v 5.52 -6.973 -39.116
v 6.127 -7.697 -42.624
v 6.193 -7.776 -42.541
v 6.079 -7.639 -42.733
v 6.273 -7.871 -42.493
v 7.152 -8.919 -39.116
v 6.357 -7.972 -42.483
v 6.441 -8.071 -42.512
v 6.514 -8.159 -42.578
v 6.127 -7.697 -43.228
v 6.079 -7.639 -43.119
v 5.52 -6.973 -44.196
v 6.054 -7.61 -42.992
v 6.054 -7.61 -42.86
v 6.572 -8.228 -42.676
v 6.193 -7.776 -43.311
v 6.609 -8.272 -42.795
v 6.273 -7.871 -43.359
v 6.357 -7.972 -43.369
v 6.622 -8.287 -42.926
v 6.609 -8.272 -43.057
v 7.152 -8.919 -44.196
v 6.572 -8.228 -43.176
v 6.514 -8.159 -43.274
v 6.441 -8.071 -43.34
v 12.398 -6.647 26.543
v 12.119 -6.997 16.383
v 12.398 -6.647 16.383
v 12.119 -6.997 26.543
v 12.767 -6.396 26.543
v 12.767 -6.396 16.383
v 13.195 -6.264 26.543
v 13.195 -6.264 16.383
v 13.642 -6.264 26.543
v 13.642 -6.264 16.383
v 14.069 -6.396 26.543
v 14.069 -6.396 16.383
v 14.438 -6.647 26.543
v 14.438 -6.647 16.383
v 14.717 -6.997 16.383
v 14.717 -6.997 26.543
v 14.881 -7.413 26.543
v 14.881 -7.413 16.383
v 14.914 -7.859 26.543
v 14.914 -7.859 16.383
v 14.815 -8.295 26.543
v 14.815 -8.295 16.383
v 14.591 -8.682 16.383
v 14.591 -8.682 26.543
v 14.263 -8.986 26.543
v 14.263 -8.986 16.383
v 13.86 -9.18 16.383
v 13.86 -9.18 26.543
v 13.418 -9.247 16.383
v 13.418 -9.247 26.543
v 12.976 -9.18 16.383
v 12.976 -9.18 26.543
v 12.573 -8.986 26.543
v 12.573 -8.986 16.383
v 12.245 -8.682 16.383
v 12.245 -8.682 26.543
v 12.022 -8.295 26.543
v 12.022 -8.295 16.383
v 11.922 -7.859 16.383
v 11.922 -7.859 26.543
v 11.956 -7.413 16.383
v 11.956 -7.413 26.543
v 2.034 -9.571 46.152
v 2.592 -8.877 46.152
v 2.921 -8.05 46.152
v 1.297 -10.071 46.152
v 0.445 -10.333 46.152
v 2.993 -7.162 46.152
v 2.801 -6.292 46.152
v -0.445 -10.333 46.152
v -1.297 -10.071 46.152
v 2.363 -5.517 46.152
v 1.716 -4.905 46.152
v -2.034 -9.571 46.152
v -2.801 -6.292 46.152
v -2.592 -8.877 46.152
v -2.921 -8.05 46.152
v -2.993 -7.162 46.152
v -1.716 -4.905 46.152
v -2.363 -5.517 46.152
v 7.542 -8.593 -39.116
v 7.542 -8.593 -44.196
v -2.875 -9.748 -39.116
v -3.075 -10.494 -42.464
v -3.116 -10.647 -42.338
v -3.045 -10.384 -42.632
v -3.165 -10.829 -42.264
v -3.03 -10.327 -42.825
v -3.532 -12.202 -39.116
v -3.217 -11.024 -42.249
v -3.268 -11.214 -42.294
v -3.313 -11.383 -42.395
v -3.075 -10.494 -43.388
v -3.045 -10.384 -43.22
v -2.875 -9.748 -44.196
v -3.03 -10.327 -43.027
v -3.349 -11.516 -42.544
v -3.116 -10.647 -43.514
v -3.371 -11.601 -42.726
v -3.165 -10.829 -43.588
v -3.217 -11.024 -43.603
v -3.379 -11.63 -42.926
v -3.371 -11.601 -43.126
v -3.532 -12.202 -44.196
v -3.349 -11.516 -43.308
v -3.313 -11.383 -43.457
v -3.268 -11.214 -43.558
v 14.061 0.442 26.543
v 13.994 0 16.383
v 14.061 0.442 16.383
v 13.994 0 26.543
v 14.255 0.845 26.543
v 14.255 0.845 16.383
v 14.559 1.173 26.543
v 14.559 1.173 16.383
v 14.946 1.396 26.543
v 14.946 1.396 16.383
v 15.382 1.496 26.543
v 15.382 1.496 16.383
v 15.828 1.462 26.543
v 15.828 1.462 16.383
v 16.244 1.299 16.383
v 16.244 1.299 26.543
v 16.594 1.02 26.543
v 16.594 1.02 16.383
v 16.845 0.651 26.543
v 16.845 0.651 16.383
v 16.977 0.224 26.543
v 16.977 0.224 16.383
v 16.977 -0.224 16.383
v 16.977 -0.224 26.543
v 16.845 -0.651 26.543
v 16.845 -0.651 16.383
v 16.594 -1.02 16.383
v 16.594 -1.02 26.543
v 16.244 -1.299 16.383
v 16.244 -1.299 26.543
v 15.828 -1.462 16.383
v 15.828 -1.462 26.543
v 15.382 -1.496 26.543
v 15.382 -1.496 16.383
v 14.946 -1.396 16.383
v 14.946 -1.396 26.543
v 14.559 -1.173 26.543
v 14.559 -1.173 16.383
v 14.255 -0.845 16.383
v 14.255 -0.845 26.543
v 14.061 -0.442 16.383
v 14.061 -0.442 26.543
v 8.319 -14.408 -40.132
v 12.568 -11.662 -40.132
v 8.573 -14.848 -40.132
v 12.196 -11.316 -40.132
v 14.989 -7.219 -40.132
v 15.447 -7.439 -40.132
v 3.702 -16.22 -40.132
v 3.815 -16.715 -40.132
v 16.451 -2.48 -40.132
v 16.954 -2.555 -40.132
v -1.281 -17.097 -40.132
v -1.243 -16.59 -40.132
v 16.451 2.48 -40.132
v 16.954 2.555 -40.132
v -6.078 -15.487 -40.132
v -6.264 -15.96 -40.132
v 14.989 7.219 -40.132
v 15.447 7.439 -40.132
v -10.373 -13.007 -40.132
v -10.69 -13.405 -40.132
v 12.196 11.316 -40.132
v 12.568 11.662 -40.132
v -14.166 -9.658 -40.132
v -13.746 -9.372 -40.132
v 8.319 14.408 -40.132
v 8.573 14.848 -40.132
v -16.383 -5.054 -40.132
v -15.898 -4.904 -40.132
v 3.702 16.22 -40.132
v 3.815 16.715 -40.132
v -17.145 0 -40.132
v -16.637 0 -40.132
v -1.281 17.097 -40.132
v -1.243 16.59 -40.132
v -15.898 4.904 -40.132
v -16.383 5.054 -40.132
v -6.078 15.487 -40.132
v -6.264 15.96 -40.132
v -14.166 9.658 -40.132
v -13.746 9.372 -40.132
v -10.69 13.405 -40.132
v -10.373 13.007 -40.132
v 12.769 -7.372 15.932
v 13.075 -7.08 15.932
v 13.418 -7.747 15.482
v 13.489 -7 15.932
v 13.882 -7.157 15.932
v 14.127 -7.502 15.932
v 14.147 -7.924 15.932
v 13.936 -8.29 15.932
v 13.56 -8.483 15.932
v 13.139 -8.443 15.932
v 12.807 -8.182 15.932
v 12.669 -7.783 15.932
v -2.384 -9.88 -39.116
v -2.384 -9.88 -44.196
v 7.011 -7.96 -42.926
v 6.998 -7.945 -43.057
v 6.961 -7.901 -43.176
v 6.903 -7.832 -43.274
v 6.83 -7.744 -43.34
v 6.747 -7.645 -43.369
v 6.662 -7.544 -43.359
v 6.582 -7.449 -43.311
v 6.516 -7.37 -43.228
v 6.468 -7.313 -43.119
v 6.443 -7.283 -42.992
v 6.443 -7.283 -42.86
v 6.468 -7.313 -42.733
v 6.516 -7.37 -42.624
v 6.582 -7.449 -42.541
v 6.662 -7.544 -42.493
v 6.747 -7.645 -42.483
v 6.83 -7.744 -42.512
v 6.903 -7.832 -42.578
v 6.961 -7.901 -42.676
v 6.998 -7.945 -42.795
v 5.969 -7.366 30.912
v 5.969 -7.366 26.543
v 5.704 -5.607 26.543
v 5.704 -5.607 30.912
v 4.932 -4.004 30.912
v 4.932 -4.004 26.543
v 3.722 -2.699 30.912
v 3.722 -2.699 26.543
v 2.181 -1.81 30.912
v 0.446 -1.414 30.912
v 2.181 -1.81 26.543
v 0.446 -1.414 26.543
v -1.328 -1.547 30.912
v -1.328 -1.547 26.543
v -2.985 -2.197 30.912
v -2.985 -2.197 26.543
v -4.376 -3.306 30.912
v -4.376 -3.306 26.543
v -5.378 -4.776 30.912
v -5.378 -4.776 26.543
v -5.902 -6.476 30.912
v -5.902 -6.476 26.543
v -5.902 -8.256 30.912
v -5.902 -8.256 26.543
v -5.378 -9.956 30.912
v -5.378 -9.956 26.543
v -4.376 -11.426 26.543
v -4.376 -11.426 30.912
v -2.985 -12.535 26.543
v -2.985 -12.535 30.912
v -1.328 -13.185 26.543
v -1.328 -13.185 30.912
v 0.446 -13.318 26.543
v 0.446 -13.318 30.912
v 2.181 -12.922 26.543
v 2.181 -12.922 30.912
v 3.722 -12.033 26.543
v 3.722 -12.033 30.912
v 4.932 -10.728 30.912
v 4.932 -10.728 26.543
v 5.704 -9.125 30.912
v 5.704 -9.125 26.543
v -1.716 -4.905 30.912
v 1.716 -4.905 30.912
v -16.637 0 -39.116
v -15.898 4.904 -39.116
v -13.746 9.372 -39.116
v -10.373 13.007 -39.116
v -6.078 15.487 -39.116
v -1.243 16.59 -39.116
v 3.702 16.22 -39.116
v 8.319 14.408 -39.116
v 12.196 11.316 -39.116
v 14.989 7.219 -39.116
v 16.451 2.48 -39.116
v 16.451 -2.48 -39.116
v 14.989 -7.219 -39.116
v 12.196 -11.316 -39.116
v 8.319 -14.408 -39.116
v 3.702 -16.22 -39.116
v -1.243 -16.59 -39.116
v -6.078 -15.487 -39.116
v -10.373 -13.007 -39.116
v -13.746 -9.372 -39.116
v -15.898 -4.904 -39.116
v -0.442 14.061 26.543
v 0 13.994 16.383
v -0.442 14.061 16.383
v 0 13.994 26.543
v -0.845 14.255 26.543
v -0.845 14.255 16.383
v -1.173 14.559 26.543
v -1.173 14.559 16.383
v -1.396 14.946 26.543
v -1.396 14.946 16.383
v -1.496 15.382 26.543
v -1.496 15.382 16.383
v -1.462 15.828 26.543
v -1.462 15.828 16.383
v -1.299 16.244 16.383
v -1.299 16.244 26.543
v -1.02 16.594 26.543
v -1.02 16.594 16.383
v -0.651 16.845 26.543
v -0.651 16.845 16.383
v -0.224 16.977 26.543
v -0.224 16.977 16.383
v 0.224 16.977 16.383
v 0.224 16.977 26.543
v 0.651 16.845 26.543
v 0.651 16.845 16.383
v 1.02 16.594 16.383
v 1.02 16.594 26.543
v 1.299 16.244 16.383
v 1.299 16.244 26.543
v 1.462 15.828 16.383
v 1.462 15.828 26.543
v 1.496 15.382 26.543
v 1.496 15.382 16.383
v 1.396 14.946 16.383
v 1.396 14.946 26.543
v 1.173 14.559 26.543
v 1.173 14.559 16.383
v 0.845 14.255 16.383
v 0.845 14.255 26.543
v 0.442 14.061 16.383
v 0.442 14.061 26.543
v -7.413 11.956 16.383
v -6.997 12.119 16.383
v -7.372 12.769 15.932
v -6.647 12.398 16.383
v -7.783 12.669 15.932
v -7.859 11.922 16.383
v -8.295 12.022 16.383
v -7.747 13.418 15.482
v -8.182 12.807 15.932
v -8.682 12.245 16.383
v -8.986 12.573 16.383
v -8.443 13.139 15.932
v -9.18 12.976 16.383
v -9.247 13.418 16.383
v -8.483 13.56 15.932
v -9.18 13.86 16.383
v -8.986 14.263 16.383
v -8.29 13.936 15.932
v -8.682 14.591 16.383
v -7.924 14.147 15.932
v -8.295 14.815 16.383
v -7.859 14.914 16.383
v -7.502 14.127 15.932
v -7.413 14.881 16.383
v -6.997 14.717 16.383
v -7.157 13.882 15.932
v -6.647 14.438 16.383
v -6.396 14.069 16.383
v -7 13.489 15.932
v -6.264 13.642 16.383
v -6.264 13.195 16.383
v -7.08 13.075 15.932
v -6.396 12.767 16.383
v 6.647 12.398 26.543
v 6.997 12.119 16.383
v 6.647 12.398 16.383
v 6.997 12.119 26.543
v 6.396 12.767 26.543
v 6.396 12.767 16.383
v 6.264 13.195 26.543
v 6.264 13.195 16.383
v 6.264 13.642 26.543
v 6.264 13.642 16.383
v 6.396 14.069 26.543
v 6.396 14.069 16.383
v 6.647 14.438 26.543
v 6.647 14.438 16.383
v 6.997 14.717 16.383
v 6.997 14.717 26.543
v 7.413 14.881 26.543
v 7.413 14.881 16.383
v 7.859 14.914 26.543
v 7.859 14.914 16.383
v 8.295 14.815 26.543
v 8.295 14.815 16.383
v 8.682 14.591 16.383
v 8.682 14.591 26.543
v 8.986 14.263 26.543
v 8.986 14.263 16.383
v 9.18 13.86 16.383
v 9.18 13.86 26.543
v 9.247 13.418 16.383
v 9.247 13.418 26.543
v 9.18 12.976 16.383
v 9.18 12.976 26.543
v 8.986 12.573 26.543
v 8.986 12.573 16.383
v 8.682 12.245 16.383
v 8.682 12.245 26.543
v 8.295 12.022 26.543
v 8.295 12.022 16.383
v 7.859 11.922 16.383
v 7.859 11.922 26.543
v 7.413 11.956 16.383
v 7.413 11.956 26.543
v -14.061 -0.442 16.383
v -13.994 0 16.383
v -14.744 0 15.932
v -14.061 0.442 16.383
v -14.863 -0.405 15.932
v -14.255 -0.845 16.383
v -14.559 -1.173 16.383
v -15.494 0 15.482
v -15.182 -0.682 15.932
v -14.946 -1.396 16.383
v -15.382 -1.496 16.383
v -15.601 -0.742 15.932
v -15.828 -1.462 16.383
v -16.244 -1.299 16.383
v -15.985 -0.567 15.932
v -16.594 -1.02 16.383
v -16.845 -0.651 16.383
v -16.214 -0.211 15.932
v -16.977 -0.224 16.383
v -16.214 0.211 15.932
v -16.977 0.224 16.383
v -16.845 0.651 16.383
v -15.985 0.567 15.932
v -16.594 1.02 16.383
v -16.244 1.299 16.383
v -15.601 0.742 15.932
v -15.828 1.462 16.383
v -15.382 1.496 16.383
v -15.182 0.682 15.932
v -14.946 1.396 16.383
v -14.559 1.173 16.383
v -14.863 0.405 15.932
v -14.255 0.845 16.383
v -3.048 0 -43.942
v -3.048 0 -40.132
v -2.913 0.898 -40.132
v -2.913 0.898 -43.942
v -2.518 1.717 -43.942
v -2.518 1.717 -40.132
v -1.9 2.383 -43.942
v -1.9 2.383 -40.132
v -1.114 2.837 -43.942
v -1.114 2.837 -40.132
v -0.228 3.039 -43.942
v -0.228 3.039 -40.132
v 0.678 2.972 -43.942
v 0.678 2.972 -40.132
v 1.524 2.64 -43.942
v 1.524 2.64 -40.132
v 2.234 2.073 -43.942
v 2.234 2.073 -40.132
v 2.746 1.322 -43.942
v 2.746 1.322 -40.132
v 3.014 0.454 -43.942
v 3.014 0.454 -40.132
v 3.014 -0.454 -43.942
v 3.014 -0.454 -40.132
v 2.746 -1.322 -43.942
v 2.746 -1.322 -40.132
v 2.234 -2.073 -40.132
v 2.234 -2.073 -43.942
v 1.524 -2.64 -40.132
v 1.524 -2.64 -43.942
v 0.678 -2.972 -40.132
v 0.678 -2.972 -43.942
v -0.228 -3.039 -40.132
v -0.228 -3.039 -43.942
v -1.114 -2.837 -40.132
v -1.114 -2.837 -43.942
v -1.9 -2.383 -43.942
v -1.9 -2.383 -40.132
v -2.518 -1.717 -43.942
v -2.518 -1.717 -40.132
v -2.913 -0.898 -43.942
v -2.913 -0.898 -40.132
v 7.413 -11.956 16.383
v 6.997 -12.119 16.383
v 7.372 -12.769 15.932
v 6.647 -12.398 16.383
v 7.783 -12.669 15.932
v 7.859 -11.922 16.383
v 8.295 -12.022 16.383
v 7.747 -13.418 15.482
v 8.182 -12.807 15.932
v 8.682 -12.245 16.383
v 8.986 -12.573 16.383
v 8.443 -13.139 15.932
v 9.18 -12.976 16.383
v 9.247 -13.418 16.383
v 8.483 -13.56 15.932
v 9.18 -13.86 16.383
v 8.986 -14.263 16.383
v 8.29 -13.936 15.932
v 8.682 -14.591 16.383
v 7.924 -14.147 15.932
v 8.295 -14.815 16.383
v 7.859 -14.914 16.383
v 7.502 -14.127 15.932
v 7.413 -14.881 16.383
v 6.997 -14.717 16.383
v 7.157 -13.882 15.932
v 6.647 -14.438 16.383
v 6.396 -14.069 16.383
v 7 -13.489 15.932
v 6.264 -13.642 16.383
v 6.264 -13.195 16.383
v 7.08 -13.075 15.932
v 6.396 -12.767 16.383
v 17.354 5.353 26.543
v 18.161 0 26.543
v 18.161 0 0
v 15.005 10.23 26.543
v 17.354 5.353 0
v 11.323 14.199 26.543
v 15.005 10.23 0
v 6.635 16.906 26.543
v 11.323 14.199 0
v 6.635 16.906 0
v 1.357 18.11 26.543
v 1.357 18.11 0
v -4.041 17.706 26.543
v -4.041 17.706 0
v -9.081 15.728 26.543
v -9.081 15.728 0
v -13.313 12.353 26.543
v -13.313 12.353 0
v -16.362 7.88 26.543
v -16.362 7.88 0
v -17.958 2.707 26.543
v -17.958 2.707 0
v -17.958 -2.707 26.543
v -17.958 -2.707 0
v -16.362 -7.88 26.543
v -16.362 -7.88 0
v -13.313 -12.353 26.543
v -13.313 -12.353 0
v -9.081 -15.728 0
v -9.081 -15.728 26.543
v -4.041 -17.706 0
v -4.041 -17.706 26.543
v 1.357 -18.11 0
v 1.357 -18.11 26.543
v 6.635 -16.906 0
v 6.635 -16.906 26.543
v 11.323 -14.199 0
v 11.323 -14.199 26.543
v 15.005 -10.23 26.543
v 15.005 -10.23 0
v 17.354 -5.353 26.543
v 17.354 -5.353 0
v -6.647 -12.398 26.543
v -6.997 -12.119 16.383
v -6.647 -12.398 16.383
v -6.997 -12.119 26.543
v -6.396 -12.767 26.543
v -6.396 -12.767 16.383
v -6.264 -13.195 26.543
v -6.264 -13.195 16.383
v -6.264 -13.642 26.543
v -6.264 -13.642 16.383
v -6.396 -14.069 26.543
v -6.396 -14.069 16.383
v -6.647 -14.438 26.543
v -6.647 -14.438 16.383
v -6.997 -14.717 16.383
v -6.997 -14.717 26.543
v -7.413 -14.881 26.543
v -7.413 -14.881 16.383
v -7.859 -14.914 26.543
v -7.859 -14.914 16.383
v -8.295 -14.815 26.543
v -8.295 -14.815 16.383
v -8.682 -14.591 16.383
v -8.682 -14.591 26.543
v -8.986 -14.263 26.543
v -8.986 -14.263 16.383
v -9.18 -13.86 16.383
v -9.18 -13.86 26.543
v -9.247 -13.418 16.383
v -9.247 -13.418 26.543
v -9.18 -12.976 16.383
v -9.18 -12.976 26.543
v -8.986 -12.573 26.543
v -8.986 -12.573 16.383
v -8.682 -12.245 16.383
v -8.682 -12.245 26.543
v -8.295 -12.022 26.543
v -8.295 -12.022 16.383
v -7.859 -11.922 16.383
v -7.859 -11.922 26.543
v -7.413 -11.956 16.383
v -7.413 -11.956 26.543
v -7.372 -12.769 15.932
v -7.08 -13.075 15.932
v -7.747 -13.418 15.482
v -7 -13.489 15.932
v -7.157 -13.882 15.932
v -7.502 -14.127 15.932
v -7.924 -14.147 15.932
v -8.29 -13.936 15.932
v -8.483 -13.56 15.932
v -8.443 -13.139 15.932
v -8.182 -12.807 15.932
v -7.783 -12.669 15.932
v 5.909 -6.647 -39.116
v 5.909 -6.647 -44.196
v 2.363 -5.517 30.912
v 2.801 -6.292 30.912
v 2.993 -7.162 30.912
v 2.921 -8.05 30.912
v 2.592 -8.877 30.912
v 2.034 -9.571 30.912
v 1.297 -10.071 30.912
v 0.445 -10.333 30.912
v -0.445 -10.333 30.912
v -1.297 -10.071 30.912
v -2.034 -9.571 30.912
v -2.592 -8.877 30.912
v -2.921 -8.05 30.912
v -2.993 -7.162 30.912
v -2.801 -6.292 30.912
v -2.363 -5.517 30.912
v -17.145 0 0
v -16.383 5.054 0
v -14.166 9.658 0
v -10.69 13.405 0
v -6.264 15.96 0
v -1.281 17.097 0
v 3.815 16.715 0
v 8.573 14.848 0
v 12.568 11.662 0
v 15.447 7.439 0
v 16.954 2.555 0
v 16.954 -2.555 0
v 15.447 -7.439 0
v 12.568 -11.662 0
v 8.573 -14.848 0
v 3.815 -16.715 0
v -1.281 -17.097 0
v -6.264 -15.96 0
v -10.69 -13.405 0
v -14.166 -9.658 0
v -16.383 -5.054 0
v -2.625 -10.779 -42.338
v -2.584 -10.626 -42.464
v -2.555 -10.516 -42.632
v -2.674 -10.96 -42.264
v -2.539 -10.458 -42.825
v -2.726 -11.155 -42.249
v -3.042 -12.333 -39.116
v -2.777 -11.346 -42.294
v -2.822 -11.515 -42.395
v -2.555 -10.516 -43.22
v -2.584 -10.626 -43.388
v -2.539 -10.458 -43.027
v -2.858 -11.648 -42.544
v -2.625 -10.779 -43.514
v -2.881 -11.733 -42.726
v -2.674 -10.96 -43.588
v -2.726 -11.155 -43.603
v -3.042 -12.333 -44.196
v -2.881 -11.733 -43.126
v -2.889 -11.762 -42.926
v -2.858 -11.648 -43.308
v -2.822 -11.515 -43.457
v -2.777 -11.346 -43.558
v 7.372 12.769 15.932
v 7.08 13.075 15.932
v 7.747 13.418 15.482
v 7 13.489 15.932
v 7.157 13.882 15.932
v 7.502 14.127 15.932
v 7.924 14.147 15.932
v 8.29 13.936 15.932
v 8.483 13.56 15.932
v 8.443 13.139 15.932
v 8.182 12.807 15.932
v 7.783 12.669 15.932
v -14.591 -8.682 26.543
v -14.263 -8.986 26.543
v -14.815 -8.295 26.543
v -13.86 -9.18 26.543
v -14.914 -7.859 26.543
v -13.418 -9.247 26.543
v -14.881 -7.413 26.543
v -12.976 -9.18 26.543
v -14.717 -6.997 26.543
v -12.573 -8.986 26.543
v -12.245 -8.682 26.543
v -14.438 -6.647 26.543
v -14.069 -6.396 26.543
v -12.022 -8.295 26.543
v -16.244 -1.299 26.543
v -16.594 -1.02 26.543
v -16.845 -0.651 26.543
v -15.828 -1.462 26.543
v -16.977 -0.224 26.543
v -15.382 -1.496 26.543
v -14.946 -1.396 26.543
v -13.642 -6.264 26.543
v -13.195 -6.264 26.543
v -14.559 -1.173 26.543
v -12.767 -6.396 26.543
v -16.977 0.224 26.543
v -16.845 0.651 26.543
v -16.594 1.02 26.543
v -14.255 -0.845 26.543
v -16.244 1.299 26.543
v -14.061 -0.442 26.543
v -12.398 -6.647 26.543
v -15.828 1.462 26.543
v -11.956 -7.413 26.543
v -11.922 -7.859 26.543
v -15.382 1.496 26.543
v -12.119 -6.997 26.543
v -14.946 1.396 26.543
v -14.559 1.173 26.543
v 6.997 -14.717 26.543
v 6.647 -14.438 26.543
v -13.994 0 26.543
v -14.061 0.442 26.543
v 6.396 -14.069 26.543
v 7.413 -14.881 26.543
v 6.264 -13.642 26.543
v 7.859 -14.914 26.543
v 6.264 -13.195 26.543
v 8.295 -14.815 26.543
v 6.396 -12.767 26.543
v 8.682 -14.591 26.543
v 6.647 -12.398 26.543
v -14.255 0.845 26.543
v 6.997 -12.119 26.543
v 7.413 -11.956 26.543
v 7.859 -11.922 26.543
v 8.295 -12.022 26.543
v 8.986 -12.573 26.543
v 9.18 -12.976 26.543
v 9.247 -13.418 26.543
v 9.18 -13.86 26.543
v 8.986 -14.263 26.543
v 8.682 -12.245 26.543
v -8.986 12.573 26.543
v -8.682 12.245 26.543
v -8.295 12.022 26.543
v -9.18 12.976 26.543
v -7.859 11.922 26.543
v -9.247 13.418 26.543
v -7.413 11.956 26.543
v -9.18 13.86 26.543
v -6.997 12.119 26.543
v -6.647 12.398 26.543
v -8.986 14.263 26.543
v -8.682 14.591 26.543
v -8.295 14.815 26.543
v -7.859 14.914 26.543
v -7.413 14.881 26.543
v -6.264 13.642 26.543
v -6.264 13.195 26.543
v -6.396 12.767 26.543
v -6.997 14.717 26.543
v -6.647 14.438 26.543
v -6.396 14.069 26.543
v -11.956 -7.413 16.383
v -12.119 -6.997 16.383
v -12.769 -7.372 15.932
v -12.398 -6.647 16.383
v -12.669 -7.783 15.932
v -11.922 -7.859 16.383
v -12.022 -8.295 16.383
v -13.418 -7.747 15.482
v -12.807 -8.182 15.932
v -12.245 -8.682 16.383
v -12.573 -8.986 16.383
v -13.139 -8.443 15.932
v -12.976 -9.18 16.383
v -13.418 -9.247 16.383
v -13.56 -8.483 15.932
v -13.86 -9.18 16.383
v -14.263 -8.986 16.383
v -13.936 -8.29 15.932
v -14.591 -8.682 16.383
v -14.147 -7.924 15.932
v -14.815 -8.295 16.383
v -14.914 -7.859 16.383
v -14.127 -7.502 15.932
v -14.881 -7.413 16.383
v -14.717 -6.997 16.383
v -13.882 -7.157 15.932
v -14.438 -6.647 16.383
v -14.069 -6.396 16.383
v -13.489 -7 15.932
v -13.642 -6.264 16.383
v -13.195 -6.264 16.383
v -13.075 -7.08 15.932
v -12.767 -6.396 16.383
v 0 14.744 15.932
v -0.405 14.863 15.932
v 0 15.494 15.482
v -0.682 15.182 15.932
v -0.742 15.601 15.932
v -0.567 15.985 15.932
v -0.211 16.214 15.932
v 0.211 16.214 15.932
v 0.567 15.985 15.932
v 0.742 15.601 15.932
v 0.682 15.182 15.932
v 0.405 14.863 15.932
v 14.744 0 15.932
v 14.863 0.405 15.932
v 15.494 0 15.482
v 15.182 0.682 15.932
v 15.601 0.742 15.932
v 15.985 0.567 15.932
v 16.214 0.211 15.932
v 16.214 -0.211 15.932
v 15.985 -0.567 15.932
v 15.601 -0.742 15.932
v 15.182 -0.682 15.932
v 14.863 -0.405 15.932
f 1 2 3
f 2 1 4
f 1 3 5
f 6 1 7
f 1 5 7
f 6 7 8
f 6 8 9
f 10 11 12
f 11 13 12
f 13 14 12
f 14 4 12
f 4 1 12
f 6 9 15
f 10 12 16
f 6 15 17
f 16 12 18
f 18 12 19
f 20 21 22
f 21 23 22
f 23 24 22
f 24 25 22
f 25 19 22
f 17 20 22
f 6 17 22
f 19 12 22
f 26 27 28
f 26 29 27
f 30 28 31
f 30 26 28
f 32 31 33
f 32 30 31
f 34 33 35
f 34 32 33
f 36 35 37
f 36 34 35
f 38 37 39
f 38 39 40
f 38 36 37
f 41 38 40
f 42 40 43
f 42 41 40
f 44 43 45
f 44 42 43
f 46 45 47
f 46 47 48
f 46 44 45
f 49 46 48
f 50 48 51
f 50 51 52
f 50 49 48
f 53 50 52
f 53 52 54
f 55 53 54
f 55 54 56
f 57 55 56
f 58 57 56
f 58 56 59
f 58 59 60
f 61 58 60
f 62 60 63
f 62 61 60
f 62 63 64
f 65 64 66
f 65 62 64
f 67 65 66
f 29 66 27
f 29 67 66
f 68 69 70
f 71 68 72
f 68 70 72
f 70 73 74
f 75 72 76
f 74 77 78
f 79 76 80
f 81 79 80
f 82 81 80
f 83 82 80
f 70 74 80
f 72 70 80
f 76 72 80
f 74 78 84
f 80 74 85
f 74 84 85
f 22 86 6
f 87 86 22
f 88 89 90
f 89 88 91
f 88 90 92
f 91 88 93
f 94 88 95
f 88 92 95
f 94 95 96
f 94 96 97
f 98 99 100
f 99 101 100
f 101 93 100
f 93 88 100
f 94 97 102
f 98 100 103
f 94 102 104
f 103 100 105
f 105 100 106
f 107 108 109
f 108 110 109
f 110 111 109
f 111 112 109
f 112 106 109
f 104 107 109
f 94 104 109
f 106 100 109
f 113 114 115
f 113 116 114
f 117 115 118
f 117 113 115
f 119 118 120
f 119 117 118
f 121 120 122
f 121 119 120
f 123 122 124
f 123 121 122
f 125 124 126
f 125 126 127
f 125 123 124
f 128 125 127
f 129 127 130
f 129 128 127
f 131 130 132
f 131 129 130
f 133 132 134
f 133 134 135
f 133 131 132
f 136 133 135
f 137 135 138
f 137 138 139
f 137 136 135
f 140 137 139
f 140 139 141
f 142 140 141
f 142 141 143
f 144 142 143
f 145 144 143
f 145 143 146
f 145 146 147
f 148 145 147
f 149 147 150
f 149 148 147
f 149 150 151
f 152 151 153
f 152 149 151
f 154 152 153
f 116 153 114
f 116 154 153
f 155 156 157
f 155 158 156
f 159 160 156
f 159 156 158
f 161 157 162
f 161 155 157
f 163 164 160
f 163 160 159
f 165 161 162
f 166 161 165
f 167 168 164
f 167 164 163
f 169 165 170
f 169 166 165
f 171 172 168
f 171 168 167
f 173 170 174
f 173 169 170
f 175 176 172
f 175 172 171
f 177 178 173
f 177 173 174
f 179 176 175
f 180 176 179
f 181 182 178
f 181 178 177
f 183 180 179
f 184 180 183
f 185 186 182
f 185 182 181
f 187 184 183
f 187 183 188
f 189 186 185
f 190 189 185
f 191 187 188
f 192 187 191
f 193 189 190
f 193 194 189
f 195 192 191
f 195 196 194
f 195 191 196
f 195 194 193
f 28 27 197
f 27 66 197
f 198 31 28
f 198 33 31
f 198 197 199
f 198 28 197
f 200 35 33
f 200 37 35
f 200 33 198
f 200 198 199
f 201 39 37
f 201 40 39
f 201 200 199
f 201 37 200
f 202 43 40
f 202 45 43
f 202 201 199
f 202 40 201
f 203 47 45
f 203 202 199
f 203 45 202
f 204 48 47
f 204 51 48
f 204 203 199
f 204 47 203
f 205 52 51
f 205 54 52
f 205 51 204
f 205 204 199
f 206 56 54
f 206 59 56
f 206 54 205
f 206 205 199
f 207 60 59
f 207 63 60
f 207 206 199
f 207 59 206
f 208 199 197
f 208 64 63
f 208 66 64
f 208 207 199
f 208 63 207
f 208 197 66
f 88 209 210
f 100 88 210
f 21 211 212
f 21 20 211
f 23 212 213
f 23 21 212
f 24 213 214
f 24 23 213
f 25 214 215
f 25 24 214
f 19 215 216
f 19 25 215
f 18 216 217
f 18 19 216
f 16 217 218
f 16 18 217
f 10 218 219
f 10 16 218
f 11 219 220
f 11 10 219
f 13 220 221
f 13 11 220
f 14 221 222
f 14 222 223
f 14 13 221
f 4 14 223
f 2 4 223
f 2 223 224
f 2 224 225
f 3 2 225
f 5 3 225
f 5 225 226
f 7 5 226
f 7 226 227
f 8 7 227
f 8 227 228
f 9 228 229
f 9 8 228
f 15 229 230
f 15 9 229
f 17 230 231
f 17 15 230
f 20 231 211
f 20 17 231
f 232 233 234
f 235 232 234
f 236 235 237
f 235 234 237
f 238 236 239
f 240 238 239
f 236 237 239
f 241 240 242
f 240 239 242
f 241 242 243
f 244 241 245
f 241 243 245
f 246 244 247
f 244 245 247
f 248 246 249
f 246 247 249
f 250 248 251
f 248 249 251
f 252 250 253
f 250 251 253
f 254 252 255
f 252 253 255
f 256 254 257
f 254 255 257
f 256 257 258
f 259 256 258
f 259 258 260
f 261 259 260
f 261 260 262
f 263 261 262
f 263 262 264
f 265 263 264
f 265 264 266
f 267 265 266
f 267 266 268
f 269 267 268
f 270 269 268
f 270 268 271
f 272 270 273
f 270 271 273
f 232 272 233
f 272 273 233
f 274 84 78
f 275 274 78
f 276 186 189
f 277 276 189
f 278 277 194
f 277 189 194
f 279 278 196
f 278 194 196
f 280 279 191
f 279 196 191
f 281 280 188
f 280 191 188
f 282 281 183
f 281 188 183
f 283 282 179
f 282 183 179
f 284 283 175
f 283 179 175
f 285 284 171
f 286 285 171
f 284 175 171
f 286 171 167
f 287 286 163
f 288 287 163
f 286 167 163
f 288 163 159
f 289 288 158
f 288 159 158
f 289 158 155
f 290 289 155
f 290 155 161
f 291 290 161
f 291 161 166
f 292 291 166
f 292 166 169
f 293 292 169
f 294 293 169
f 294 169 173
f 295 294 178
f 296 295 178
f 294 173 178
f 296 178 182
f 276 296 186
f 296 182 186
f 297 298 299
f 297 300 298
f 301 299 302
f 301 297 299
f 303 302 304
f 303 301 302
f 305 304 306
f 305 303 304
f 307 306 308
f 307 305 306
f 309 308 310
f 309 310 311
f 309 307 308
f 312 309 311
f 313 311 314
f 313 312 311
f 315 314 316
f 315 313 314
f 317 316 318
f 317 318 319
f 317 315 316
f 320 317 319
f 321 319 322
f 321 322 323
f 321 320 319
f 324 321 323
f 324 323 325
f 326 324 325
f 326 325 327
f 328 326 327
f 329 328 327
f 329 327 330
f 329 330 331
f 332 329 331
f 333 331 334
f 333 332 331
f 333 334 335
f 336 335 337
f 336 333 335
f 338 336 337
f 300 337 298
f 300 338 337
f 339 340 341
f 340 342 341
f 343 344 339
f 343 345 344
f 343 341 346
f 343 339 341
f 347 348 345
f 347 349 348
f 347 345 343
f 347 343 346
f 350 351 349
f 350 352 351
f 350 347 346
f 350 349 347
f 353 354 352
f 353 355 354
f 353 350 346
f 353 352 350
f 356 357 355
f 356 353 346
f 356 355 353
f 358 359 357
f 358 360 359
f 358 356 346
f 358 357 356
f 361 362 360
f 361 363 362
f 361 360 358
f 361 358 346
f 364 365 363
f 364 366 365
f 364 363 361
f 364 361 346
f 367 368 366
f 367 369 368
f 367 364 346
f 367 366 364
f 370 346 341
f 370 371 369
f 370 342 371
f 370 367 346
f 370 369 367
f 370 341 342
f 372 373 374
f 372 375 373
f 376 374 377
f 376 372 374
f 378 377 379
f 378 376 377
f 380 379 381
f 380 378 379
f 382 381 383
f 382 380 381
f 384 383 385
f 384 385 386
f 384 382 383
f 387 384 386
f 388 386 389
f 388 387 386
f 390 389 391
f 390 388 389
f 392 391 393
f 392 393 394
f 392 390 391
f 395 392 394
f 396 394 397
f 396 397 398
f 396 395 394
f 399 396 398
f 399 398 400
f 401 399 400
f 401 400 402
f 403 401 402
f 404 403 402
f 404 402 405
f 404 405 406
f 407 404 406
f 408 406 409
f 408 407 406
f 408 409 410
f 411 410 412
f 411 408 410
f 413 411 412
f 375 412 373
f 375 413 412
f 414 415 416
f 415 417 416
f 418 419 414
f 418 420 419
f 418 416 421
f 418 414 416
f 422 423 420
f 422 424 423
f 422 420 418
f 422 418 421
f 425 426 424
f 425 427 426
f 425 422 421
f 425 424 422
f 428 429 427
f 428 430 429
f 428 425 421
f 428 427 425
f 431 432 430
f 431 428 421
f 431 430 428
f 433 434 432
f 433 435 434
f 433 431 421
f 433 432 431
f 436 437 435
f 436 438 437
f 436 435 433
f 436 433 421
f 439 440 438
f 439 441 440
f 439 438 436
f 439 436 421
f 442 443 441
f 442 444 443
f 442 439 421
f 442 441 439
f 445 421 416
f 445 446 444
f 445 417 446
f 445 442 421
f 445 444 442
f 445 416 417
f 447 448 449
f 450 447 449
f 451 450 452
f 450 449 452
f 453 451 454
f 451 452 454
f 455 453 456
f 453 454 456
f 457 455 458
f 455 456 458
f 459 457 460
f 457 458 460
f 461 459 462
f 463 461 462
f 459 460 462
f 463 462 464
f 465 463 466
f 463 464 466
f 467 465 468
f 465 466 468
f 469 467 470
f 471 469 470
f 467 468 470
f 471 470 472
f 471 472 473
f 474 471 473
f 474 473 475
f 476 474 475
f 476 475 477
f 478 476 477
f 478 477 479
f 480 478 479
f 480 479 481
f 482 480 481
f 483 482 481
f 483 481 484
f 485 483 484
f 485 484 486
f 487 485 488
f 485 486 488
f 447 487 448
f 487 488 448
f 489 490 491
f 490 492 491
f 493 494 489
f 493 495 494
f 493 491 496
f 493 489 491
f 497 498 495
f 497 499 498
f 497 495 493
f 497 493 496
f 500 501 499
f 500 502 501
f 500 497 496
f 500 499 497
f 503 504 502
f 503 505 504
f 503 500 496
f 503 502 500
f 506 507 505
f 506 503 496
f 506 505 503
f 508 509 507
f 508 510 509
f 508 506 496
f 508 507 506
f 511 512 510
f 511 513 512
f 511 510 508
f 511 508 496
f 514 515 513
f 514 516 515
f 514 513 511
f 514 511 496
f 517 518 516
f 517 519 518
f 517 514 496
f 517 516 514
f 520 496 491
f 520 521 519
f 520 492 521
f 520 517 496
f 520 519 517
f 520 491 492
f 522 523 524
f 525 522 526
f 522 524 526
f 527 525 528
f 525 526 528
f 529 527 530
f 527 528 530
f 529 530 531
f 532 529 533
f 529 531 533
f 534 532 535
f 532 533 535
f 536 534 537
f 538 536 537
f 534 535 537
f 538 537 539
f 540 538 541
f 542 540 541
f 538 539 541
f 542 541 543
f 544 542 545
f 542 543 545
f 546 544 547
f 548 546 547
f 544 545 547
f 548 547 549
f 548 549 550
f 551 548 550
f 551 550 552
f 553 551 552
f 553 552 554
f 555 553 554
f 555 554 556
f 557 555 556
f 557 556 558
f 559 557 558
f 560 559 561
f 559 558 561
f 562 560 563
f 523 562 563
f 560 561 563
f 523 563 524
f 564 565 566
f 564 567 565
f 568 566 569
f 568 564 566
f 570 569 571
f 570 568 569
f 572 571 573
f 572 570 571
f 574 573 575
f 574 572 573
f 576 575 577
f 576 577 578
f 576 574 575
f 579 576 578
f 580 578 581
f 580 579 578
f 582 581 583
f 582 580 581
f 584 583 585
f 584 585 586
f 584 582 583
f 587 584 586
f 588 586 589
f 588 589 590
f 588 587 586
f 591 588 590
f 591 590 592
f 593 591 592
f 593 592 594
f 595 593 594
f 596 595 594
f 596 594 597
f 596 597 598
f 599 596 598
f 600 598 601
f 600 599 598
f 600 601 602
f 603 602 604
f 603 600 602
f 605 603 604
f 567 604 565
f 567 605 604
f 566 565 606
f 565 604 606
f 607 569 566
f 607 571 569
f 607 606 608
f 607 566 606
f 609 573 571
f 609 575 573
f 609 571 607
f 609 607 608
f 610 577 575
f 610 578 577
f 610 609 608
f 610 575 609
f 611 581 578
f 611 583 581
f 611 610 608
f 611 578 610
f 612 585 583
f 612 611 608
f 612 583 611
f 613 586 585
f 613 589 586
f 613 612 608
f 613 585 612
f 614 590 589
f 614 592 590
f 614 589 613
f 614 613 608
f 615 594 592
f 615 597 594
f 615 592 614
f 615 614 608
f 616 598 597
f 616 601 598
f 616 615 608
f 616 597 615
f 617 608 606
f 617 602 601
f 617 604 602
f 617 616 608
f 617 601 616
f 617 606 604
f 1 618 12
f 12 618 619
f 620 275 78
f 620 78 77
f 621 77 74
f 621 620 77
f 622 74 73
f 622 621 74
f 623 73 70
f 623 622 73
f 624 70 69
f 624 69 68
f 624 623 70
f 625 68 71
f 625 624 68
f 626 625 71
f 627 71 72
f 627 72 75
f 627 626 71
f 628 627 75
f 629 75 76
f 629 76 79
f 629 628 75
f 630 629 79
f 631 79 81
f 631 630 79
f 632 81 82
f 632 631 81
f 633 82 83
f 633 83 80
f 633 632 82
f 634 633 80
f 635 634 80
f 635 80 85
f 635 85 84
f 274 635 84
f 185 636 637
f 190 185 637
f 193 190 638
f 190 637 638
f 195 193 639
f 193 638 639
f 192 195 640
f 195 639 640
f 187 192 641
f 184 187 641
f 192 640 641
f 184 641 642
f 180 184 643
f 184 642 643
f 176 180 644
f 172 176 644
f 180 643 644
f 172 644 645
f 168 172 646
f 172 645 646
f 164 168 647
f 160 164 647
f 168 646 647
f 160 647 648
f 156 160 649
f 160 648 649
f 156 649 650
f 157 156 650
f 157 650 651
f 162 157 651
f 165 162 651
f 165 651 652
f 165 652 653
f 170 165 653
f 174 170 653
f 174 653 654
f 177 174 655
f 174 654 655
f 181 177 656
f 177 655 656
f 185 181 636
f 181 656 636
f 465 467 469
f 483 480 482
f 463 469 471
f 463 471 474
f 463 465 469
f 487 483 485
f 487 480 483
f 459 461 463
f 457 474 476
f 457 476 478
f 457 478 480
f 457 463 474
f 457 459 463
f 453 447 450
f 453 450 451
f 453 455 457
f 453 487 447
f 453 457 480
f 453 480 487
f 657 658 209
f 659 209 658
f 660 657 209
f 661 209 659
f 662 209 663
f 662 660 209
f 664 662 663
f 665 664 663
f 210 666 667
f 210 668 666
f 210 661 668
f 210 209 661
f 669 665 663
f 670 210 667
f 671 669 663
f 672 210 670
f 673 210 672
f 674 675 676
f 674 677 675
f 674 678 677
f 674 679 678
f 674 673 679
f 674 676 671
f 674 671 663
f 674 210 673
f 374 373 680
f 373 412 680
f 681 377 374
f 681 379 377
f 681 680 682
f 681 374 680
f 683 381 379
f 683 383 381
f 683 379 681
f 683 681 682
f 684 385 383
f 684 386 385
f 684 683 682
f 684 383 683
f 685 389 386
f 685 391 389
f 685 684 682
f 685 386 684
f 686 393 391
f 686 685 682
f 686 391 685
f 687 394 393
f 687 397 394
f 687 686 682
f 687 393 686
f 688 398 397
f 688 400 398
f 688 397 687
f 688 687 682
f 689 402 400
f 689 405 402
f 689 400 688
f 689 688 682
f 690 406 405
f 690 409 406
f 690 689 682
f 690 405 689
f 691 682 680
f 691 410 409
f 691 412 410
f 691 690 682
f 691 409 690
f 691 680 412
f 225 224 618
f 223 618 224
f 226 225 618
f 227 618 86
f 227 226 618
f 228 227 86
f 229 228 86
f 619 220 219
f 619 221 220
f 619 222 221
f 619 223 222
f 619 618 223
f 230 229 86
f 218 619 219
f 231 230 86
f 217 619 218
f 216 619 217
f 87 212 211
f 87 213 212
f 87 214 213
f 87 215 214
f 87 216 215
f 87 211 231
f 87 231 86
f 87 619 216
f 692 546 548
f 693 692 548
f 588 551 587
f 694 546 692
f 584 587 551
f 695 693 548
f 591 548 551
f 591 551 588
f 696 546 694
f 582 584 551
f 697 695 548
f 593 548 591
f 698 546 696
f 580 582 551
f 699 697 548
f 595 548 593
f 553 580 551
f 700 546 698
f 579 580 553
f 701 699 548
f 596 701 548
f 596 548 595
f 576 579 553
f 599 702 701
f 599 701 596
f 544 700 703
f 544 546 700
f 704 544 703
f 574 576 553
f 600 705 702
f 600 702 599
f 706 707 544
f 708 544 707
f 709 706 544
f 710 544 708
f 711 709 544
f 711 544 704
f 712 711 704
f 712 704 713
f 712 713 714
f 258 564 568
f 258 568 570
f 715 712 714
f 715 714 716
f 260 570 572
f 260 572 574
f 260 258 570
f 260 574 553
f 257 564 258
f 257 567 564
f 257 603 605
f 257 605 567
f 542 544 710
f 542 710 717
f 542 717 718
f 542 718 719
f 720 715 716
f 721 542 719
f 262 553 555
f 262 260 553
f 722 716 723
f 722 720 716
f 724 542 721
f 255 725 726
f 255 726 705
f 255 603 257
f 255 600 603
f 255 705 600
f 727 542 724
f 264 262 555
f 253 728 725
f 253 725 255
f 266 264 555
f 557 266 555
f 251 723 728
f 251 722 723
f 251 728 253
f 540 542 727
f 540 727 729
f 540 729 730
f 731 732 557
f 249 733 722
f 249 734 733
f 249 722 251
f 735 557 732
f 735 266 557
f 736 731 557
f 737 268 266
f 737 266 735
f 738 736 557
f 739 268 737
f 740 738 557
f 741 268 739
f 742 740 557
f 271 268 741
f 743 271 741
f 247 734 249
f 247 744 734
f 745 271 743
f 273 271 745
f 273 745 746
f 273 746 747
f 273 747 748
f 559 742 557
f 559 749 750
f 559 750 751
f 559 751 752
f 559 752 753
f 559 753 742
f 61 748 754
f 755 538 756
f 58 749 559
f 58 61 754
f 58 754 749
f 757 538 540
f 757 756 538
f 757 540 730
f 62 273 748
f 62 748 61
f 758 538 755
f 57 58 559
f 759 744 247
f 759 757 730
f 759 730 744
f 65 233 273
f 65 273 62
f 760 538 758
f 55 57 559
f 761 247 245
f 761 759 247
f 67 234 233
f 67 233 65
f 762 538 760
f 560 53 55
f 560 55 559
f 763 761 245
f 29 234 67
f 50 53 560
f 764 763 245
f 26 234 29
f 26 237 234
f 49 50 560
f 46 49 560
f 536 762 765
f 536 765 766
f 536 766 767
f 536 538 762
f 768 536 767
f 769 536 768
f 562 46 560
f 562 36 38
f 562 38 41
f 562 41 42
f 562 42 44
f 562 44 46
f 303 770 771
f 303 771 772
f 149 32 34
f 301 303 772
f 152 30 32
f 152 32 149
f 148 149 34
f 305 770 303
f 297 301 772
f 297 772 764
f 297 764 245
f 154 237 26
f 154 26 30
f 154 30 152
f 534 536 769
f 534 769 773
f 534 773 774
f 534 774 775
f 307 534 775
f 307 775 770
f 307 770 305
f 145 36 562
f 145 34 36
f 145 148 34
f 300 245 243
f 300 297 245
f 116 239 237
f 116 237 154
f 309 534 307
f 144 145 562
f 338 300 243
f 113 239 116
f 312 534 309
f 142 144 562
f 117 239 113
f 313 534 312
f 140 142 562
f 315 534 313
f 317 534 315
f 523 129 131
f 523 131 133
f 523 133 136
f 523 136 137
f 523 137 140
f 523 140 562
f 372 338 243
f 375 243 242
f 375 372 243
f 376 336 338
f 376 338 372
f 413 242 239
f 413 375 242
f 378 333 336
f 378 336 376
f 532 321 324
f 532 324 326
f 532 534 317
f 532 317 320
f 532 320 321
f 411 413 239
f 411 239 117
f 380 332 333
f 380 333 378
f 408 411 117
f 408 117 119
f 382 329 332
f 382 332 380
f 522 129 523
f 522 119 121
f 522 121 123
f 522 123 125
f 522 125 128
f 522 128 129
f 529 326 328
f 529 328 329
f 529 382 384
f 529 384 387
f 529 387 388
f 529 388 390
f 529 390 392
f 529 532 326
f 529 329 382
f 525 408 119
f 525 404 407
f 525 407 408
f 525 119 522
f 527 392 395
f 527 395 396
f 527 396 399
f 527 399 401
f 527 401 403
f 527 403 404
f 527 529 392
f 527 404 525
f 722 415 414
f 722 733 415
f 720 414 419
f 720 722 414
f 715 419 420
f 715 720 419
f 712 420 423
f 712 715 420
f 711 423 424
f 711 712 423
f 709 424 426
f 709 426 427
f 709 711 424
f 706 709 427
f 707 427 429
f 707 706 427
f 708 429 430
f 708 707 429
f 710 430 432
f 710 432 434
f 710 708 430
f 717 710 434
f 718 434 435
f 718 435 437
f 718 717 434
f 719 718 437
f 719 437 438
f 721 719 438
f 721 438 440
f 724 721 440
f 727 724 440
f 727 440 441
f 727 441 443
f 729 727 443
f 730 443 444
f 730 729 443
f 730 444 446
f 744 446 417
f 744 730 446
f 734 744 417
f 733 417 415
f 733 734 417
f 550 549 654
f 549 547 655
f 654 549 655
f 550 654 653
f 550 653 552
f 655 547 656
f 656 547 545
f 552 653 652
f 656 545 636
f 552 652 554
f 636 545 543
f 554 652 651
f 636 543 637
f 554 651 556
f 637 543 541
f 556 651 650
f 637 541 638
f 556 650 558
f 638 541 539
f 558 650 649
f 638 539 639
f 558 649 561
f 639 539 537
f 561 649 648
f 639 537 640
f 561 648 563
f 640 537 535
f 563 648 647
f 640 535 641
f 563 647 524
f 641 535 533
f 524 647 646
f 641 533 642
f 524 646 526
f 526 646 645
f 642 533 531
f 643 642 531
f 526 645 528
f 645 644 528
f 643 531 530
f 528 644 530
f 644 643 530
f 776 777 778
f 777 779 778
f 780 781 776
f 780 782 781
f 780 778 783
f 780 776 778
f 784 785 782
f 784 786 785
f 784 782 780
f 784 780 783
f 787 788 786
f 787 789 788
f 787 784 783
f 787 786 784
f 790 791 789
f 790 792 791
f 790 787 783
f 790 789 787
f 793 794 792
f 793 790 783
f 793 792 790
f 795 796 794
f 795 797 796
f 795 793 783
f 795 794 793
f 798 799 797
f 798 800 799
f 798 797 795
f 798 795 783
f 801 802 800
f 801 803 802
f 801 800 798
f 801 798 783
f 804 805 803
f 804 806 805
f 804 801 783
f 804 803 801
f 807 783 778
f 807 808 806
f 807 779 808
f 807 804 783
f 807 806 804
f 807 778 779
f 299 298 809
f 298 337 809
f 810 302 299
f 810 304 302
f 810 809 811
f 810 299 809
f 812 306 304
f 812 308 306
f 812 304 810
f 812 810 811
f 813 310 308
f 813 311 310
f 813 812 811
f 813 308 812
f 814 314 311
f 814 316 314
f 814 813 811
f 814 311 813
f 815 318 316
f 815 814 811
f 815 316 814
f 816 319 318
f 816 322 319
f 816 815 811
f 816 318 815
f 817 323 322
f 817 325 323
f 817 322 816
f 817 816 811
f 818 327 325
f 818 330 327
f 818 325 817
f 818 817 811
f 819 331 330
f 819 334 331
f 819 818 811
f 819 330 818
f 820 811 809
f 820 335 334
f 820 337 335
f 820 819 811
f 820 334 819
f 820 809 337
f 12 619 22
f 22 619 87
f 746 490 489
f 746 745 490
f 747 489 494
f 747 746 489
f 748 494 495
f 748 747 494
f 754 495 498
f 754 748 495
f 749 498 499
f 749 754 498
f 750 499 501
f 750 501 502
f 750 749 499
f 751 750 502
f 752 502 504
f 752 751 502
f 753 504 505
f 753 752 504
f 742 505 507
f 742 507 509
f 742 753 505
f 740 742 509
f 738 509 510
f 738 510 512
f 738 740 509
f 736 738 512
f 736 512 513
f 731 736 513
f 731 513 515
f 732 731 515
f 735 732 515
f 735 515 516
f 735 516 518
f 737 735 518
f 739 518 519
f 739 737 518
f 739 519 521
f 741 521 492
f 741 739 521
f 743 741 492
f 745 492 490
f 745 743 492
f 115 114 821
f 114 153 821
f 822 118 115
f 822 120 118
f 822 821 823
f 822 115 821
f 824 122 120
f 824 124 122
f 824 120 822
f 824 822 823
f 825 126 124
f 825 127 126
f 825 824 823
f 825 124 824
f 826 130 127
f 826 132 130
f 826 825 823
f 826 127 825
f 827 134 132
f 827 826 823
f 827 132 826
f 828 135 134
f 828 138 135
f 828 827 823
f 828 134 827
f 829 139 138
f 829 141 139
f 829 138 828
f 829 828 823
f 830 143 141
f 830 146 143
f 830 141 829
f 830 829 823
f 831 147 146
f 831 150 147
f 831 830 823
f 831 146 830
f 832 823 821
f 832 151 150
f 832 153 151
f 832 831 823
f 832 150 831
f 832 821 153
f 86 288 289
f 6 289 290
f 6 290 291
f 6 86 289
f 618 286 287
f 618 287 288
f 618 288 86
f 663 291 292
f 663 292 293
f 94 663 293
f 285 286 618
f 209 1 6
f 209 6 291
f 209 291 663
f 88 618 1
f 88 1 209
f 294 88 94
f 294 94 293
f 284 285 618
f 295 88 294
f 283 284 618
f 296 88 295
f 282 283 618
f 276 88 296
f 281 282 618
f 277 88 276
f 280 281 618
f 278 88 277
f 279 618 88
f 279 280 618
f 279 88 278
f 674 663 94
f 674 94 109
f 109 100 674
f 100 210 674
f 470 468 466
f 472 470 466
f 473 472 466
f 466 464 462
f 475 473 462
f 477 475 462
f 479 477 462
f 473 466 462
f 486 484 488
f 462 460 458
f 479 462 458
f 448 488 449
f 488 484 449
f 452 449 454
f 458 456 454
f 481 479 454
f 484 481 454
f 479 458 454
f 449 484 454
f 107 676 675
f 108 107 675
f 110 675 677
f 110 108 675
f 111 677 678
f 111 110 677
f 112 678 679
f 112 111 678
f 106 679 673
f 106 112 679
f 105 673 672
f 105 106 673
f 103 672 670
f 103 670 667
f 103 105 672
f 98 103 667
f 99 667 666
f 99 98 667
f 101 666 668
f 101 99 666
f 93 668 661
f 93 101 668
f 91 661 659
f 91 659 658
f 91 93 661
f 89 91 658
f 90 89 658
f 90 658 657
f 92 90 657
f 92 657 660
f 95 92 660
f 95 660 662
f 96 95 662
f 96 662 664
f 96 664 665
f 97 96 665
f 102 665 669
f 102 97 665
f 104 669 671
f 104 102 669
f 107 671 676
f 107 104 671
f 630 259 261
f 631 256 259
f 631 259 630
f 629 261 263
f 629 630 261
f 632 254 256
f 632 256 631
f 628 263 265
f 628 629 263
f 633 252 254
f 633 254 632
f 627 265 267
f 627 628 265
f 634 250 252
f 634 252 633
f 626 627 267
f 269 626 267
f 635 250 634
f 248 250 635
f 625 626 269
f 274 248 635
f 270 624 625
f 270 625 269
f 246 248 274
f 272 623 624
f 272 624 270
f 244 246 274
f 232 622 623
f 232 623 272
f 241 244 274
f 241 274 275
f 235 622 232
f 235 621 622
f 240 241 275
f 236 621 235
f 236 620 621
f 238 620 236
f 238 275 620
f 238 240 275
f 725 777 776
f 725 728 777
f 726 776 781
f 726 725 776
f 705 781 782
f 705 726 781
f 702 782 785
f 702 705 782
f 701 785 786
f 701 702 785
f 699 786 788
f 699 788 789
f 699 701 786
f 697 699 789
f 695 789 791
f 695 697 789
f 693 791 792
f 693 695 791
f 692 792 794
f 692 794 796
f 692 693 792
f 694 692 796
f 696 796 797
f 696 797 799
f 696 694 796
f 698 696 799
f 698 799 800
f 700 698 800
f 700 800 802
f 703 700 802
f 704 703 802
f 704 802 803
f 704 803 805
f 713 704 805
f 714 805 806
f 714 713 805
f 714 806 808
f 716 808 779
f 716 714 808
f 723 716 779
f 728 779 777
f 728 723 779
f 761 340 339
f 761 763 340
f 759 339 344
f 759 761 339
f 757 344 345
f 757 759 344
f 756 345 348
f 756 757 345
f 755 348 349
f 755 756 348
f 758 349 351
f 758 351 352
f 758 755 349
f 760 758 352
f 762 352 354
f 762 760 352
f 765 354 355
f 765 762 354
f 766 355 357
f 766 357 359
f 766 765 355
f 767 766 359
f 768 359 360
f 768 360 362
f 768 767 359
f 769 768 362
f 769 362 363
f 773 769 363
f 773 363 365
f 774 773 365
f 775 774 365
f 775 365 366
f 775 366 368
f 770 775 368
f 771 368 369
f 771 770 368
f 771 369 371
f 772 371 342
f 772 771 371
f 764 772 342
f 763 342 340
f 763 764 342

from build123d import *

# Parameters (mm, degrees)
SKETCH1_R           = 18.161
BOSS_EXTRUDE1_DEPTH = 26.543
SKETCH5_R           = 5.969
BOSS_EXTRUDE5_DEPTH = 4.3688
BOSS_EXTRUDE6_DEPTH = 15.24
CIRPATTERN2_COUNT   = 12
SKETCH2_R           = 17.145
BOSS_EXTRUDE2_DEPTH = 40.132
SKETCH3_R           = 3.048
BOSS_EXTRUDE3_DEPTH = 3.81
SKETCH13_R          = 16.637
CUT_EXTRUDE1_DEPTH  = 1.016
SKETCH15_W          = 2.54
SKETCH15_H          = 5.08
SKETCH15_R          = 0.4445
BOSS_EXTRUDE7_DEPTH = 0.254
SKETCH16_W          = 2.54
SKETCH16_H          = 5.08
SKETCH16_R          = 0.678606607
BOSS_EXTRUDE8_DEPTH = 0.254


with BuildPart() as part:
    # Sketch1 → Boss-Extrude1 (new body)
    with BuildSketch(Plane.XY):
        Circle(SKETCH1_R)
    extrude(amount=BOSS_EXTRUDE1_DEPTH)

    # Sketch5 → Boss-Extrude5 (add)
    with BuildSketch(Plane.XY.offset(26.543)):
        with Locations((0, -7.366)):
            Circle(SKETCH5_R)
    extrude(amount=BOSS_EXTRUDE5_DEPTH)

    # Sketch6 → Boss-Extrude6 (add)
    with BuildSketch(Plane.XY.offset(30.9118)):
        with BuildLine():
            Line((-1.715657017, -4.905), (1.715657017, -4.905))
            ThreePointArc((1.715657017, -4.905), (0, -10.366), (-1.715657017, -4.905))
        make_face()
    extrude(amount=BOSS_EXTRUDE6_DEPTH)

    # Sketch12 → Ø3.0mm Dowel Hole1 (revolve, cut)
    with BuildSketch(Plane(origin=(0, 15.494, 26.543), x_dir=(0, -1, 0), z_dir=(1, 0, 0))):
        Polygon((0, 0), (0, 11.061290929), (1.5, 10.16), (1.5, 0), align=None)
    f_3_0mm_dowel_hole1 = revolve(axis=Axis((0, 15.494, 32.893), (0, 0, -1)), mode=Mode.SUBTRACT)

    # CirPattern2: Ø3.0mm Dowel Hole1 ×12 about axis, 3 skipped
    cirpattern2_axis = Axis((0, 0, 0), (0, 0, -1))
    add([f_3_0mm_dowel_hole1.rotate(cirpattern2_axis, i * 360 / CIRPATTERN2_COUNT) for i in range(1, CIRPATTERN2_COUNT) if i not in (2, 6, 10)], mode=Mode.SUBTRACT)

    # Sketch2 → Boss-Extrude2 (add)
    with BuildSketch(Plane(origin=(0, 0, 0), x_dir=(-1, 0, 0), z_dir=(0, 0, -1))):
        Circle(SKETCH2_R)
    extrude(amount=BOSS_EXTRUDE2_DEPTH)

    # Sketch3 → Boss-Extrude3 (add)
    with BuildSketch(Plane(origin=(0, 0, -40.132), x_dir=(-1, 0, 0), z_dir=(0, 0, -1))):
        Circle(SKETCH3_R)
    extrude(amount=BOSS_EXTRUDE3_DEPTH)

    # Sketch13 → Cut-Extrude1 (cut)
    with BuildSketch(Plane(origin=(0, 0, -40.132), x_dir=(-1, 0, 0), z_dir=(0, 0, -1))):
        Circle(SKETCH13_R)
    extrude(amount=-CUT_EXTRUDE1_DEPTH, mode=Mode.SUBTRACT)

    # Sketch15 → Boss-Extrude7 (add, symmetric)
    with BuildSketch(Plane(origin=(0, 0, 0), x_dir=(0.64278761, -0.766044443, 0), z_dir=(0.766044443, 0.64278761, 0))):
        with Locations((10.16, 41.656)):
            Rectangle(SKETCH15_W, SKETCH15_H)
        with Locations((10.16, 42.926)):
            Circle(SKETCH15_R, mode=Mode.SUBTRACT)
    extrude(amount=BOSS_EXTRUDE7_DEPTH, both=True)

    # Sketch16 → Boss-Extrude8 (add, symmetric)
    with BuildSketch(Plane(origin=(0, 0, 0), x_dir=(-0.258819045, -0.965925826, 0), z_dir=(0.965925826, -0.258819045, 0))):
        with Locations((11.43, 41.656)):
            Rectangle(SKETCH16_W, SKETCH16_H)
        with Locations((11.43, 42.926)):
            Circle(SKETCH16_R, mode=Mode.SUBTRACT)
    extrude(amount=BOSS_EXTRUDE8_DEPTH, both=True)


solid = part.part
